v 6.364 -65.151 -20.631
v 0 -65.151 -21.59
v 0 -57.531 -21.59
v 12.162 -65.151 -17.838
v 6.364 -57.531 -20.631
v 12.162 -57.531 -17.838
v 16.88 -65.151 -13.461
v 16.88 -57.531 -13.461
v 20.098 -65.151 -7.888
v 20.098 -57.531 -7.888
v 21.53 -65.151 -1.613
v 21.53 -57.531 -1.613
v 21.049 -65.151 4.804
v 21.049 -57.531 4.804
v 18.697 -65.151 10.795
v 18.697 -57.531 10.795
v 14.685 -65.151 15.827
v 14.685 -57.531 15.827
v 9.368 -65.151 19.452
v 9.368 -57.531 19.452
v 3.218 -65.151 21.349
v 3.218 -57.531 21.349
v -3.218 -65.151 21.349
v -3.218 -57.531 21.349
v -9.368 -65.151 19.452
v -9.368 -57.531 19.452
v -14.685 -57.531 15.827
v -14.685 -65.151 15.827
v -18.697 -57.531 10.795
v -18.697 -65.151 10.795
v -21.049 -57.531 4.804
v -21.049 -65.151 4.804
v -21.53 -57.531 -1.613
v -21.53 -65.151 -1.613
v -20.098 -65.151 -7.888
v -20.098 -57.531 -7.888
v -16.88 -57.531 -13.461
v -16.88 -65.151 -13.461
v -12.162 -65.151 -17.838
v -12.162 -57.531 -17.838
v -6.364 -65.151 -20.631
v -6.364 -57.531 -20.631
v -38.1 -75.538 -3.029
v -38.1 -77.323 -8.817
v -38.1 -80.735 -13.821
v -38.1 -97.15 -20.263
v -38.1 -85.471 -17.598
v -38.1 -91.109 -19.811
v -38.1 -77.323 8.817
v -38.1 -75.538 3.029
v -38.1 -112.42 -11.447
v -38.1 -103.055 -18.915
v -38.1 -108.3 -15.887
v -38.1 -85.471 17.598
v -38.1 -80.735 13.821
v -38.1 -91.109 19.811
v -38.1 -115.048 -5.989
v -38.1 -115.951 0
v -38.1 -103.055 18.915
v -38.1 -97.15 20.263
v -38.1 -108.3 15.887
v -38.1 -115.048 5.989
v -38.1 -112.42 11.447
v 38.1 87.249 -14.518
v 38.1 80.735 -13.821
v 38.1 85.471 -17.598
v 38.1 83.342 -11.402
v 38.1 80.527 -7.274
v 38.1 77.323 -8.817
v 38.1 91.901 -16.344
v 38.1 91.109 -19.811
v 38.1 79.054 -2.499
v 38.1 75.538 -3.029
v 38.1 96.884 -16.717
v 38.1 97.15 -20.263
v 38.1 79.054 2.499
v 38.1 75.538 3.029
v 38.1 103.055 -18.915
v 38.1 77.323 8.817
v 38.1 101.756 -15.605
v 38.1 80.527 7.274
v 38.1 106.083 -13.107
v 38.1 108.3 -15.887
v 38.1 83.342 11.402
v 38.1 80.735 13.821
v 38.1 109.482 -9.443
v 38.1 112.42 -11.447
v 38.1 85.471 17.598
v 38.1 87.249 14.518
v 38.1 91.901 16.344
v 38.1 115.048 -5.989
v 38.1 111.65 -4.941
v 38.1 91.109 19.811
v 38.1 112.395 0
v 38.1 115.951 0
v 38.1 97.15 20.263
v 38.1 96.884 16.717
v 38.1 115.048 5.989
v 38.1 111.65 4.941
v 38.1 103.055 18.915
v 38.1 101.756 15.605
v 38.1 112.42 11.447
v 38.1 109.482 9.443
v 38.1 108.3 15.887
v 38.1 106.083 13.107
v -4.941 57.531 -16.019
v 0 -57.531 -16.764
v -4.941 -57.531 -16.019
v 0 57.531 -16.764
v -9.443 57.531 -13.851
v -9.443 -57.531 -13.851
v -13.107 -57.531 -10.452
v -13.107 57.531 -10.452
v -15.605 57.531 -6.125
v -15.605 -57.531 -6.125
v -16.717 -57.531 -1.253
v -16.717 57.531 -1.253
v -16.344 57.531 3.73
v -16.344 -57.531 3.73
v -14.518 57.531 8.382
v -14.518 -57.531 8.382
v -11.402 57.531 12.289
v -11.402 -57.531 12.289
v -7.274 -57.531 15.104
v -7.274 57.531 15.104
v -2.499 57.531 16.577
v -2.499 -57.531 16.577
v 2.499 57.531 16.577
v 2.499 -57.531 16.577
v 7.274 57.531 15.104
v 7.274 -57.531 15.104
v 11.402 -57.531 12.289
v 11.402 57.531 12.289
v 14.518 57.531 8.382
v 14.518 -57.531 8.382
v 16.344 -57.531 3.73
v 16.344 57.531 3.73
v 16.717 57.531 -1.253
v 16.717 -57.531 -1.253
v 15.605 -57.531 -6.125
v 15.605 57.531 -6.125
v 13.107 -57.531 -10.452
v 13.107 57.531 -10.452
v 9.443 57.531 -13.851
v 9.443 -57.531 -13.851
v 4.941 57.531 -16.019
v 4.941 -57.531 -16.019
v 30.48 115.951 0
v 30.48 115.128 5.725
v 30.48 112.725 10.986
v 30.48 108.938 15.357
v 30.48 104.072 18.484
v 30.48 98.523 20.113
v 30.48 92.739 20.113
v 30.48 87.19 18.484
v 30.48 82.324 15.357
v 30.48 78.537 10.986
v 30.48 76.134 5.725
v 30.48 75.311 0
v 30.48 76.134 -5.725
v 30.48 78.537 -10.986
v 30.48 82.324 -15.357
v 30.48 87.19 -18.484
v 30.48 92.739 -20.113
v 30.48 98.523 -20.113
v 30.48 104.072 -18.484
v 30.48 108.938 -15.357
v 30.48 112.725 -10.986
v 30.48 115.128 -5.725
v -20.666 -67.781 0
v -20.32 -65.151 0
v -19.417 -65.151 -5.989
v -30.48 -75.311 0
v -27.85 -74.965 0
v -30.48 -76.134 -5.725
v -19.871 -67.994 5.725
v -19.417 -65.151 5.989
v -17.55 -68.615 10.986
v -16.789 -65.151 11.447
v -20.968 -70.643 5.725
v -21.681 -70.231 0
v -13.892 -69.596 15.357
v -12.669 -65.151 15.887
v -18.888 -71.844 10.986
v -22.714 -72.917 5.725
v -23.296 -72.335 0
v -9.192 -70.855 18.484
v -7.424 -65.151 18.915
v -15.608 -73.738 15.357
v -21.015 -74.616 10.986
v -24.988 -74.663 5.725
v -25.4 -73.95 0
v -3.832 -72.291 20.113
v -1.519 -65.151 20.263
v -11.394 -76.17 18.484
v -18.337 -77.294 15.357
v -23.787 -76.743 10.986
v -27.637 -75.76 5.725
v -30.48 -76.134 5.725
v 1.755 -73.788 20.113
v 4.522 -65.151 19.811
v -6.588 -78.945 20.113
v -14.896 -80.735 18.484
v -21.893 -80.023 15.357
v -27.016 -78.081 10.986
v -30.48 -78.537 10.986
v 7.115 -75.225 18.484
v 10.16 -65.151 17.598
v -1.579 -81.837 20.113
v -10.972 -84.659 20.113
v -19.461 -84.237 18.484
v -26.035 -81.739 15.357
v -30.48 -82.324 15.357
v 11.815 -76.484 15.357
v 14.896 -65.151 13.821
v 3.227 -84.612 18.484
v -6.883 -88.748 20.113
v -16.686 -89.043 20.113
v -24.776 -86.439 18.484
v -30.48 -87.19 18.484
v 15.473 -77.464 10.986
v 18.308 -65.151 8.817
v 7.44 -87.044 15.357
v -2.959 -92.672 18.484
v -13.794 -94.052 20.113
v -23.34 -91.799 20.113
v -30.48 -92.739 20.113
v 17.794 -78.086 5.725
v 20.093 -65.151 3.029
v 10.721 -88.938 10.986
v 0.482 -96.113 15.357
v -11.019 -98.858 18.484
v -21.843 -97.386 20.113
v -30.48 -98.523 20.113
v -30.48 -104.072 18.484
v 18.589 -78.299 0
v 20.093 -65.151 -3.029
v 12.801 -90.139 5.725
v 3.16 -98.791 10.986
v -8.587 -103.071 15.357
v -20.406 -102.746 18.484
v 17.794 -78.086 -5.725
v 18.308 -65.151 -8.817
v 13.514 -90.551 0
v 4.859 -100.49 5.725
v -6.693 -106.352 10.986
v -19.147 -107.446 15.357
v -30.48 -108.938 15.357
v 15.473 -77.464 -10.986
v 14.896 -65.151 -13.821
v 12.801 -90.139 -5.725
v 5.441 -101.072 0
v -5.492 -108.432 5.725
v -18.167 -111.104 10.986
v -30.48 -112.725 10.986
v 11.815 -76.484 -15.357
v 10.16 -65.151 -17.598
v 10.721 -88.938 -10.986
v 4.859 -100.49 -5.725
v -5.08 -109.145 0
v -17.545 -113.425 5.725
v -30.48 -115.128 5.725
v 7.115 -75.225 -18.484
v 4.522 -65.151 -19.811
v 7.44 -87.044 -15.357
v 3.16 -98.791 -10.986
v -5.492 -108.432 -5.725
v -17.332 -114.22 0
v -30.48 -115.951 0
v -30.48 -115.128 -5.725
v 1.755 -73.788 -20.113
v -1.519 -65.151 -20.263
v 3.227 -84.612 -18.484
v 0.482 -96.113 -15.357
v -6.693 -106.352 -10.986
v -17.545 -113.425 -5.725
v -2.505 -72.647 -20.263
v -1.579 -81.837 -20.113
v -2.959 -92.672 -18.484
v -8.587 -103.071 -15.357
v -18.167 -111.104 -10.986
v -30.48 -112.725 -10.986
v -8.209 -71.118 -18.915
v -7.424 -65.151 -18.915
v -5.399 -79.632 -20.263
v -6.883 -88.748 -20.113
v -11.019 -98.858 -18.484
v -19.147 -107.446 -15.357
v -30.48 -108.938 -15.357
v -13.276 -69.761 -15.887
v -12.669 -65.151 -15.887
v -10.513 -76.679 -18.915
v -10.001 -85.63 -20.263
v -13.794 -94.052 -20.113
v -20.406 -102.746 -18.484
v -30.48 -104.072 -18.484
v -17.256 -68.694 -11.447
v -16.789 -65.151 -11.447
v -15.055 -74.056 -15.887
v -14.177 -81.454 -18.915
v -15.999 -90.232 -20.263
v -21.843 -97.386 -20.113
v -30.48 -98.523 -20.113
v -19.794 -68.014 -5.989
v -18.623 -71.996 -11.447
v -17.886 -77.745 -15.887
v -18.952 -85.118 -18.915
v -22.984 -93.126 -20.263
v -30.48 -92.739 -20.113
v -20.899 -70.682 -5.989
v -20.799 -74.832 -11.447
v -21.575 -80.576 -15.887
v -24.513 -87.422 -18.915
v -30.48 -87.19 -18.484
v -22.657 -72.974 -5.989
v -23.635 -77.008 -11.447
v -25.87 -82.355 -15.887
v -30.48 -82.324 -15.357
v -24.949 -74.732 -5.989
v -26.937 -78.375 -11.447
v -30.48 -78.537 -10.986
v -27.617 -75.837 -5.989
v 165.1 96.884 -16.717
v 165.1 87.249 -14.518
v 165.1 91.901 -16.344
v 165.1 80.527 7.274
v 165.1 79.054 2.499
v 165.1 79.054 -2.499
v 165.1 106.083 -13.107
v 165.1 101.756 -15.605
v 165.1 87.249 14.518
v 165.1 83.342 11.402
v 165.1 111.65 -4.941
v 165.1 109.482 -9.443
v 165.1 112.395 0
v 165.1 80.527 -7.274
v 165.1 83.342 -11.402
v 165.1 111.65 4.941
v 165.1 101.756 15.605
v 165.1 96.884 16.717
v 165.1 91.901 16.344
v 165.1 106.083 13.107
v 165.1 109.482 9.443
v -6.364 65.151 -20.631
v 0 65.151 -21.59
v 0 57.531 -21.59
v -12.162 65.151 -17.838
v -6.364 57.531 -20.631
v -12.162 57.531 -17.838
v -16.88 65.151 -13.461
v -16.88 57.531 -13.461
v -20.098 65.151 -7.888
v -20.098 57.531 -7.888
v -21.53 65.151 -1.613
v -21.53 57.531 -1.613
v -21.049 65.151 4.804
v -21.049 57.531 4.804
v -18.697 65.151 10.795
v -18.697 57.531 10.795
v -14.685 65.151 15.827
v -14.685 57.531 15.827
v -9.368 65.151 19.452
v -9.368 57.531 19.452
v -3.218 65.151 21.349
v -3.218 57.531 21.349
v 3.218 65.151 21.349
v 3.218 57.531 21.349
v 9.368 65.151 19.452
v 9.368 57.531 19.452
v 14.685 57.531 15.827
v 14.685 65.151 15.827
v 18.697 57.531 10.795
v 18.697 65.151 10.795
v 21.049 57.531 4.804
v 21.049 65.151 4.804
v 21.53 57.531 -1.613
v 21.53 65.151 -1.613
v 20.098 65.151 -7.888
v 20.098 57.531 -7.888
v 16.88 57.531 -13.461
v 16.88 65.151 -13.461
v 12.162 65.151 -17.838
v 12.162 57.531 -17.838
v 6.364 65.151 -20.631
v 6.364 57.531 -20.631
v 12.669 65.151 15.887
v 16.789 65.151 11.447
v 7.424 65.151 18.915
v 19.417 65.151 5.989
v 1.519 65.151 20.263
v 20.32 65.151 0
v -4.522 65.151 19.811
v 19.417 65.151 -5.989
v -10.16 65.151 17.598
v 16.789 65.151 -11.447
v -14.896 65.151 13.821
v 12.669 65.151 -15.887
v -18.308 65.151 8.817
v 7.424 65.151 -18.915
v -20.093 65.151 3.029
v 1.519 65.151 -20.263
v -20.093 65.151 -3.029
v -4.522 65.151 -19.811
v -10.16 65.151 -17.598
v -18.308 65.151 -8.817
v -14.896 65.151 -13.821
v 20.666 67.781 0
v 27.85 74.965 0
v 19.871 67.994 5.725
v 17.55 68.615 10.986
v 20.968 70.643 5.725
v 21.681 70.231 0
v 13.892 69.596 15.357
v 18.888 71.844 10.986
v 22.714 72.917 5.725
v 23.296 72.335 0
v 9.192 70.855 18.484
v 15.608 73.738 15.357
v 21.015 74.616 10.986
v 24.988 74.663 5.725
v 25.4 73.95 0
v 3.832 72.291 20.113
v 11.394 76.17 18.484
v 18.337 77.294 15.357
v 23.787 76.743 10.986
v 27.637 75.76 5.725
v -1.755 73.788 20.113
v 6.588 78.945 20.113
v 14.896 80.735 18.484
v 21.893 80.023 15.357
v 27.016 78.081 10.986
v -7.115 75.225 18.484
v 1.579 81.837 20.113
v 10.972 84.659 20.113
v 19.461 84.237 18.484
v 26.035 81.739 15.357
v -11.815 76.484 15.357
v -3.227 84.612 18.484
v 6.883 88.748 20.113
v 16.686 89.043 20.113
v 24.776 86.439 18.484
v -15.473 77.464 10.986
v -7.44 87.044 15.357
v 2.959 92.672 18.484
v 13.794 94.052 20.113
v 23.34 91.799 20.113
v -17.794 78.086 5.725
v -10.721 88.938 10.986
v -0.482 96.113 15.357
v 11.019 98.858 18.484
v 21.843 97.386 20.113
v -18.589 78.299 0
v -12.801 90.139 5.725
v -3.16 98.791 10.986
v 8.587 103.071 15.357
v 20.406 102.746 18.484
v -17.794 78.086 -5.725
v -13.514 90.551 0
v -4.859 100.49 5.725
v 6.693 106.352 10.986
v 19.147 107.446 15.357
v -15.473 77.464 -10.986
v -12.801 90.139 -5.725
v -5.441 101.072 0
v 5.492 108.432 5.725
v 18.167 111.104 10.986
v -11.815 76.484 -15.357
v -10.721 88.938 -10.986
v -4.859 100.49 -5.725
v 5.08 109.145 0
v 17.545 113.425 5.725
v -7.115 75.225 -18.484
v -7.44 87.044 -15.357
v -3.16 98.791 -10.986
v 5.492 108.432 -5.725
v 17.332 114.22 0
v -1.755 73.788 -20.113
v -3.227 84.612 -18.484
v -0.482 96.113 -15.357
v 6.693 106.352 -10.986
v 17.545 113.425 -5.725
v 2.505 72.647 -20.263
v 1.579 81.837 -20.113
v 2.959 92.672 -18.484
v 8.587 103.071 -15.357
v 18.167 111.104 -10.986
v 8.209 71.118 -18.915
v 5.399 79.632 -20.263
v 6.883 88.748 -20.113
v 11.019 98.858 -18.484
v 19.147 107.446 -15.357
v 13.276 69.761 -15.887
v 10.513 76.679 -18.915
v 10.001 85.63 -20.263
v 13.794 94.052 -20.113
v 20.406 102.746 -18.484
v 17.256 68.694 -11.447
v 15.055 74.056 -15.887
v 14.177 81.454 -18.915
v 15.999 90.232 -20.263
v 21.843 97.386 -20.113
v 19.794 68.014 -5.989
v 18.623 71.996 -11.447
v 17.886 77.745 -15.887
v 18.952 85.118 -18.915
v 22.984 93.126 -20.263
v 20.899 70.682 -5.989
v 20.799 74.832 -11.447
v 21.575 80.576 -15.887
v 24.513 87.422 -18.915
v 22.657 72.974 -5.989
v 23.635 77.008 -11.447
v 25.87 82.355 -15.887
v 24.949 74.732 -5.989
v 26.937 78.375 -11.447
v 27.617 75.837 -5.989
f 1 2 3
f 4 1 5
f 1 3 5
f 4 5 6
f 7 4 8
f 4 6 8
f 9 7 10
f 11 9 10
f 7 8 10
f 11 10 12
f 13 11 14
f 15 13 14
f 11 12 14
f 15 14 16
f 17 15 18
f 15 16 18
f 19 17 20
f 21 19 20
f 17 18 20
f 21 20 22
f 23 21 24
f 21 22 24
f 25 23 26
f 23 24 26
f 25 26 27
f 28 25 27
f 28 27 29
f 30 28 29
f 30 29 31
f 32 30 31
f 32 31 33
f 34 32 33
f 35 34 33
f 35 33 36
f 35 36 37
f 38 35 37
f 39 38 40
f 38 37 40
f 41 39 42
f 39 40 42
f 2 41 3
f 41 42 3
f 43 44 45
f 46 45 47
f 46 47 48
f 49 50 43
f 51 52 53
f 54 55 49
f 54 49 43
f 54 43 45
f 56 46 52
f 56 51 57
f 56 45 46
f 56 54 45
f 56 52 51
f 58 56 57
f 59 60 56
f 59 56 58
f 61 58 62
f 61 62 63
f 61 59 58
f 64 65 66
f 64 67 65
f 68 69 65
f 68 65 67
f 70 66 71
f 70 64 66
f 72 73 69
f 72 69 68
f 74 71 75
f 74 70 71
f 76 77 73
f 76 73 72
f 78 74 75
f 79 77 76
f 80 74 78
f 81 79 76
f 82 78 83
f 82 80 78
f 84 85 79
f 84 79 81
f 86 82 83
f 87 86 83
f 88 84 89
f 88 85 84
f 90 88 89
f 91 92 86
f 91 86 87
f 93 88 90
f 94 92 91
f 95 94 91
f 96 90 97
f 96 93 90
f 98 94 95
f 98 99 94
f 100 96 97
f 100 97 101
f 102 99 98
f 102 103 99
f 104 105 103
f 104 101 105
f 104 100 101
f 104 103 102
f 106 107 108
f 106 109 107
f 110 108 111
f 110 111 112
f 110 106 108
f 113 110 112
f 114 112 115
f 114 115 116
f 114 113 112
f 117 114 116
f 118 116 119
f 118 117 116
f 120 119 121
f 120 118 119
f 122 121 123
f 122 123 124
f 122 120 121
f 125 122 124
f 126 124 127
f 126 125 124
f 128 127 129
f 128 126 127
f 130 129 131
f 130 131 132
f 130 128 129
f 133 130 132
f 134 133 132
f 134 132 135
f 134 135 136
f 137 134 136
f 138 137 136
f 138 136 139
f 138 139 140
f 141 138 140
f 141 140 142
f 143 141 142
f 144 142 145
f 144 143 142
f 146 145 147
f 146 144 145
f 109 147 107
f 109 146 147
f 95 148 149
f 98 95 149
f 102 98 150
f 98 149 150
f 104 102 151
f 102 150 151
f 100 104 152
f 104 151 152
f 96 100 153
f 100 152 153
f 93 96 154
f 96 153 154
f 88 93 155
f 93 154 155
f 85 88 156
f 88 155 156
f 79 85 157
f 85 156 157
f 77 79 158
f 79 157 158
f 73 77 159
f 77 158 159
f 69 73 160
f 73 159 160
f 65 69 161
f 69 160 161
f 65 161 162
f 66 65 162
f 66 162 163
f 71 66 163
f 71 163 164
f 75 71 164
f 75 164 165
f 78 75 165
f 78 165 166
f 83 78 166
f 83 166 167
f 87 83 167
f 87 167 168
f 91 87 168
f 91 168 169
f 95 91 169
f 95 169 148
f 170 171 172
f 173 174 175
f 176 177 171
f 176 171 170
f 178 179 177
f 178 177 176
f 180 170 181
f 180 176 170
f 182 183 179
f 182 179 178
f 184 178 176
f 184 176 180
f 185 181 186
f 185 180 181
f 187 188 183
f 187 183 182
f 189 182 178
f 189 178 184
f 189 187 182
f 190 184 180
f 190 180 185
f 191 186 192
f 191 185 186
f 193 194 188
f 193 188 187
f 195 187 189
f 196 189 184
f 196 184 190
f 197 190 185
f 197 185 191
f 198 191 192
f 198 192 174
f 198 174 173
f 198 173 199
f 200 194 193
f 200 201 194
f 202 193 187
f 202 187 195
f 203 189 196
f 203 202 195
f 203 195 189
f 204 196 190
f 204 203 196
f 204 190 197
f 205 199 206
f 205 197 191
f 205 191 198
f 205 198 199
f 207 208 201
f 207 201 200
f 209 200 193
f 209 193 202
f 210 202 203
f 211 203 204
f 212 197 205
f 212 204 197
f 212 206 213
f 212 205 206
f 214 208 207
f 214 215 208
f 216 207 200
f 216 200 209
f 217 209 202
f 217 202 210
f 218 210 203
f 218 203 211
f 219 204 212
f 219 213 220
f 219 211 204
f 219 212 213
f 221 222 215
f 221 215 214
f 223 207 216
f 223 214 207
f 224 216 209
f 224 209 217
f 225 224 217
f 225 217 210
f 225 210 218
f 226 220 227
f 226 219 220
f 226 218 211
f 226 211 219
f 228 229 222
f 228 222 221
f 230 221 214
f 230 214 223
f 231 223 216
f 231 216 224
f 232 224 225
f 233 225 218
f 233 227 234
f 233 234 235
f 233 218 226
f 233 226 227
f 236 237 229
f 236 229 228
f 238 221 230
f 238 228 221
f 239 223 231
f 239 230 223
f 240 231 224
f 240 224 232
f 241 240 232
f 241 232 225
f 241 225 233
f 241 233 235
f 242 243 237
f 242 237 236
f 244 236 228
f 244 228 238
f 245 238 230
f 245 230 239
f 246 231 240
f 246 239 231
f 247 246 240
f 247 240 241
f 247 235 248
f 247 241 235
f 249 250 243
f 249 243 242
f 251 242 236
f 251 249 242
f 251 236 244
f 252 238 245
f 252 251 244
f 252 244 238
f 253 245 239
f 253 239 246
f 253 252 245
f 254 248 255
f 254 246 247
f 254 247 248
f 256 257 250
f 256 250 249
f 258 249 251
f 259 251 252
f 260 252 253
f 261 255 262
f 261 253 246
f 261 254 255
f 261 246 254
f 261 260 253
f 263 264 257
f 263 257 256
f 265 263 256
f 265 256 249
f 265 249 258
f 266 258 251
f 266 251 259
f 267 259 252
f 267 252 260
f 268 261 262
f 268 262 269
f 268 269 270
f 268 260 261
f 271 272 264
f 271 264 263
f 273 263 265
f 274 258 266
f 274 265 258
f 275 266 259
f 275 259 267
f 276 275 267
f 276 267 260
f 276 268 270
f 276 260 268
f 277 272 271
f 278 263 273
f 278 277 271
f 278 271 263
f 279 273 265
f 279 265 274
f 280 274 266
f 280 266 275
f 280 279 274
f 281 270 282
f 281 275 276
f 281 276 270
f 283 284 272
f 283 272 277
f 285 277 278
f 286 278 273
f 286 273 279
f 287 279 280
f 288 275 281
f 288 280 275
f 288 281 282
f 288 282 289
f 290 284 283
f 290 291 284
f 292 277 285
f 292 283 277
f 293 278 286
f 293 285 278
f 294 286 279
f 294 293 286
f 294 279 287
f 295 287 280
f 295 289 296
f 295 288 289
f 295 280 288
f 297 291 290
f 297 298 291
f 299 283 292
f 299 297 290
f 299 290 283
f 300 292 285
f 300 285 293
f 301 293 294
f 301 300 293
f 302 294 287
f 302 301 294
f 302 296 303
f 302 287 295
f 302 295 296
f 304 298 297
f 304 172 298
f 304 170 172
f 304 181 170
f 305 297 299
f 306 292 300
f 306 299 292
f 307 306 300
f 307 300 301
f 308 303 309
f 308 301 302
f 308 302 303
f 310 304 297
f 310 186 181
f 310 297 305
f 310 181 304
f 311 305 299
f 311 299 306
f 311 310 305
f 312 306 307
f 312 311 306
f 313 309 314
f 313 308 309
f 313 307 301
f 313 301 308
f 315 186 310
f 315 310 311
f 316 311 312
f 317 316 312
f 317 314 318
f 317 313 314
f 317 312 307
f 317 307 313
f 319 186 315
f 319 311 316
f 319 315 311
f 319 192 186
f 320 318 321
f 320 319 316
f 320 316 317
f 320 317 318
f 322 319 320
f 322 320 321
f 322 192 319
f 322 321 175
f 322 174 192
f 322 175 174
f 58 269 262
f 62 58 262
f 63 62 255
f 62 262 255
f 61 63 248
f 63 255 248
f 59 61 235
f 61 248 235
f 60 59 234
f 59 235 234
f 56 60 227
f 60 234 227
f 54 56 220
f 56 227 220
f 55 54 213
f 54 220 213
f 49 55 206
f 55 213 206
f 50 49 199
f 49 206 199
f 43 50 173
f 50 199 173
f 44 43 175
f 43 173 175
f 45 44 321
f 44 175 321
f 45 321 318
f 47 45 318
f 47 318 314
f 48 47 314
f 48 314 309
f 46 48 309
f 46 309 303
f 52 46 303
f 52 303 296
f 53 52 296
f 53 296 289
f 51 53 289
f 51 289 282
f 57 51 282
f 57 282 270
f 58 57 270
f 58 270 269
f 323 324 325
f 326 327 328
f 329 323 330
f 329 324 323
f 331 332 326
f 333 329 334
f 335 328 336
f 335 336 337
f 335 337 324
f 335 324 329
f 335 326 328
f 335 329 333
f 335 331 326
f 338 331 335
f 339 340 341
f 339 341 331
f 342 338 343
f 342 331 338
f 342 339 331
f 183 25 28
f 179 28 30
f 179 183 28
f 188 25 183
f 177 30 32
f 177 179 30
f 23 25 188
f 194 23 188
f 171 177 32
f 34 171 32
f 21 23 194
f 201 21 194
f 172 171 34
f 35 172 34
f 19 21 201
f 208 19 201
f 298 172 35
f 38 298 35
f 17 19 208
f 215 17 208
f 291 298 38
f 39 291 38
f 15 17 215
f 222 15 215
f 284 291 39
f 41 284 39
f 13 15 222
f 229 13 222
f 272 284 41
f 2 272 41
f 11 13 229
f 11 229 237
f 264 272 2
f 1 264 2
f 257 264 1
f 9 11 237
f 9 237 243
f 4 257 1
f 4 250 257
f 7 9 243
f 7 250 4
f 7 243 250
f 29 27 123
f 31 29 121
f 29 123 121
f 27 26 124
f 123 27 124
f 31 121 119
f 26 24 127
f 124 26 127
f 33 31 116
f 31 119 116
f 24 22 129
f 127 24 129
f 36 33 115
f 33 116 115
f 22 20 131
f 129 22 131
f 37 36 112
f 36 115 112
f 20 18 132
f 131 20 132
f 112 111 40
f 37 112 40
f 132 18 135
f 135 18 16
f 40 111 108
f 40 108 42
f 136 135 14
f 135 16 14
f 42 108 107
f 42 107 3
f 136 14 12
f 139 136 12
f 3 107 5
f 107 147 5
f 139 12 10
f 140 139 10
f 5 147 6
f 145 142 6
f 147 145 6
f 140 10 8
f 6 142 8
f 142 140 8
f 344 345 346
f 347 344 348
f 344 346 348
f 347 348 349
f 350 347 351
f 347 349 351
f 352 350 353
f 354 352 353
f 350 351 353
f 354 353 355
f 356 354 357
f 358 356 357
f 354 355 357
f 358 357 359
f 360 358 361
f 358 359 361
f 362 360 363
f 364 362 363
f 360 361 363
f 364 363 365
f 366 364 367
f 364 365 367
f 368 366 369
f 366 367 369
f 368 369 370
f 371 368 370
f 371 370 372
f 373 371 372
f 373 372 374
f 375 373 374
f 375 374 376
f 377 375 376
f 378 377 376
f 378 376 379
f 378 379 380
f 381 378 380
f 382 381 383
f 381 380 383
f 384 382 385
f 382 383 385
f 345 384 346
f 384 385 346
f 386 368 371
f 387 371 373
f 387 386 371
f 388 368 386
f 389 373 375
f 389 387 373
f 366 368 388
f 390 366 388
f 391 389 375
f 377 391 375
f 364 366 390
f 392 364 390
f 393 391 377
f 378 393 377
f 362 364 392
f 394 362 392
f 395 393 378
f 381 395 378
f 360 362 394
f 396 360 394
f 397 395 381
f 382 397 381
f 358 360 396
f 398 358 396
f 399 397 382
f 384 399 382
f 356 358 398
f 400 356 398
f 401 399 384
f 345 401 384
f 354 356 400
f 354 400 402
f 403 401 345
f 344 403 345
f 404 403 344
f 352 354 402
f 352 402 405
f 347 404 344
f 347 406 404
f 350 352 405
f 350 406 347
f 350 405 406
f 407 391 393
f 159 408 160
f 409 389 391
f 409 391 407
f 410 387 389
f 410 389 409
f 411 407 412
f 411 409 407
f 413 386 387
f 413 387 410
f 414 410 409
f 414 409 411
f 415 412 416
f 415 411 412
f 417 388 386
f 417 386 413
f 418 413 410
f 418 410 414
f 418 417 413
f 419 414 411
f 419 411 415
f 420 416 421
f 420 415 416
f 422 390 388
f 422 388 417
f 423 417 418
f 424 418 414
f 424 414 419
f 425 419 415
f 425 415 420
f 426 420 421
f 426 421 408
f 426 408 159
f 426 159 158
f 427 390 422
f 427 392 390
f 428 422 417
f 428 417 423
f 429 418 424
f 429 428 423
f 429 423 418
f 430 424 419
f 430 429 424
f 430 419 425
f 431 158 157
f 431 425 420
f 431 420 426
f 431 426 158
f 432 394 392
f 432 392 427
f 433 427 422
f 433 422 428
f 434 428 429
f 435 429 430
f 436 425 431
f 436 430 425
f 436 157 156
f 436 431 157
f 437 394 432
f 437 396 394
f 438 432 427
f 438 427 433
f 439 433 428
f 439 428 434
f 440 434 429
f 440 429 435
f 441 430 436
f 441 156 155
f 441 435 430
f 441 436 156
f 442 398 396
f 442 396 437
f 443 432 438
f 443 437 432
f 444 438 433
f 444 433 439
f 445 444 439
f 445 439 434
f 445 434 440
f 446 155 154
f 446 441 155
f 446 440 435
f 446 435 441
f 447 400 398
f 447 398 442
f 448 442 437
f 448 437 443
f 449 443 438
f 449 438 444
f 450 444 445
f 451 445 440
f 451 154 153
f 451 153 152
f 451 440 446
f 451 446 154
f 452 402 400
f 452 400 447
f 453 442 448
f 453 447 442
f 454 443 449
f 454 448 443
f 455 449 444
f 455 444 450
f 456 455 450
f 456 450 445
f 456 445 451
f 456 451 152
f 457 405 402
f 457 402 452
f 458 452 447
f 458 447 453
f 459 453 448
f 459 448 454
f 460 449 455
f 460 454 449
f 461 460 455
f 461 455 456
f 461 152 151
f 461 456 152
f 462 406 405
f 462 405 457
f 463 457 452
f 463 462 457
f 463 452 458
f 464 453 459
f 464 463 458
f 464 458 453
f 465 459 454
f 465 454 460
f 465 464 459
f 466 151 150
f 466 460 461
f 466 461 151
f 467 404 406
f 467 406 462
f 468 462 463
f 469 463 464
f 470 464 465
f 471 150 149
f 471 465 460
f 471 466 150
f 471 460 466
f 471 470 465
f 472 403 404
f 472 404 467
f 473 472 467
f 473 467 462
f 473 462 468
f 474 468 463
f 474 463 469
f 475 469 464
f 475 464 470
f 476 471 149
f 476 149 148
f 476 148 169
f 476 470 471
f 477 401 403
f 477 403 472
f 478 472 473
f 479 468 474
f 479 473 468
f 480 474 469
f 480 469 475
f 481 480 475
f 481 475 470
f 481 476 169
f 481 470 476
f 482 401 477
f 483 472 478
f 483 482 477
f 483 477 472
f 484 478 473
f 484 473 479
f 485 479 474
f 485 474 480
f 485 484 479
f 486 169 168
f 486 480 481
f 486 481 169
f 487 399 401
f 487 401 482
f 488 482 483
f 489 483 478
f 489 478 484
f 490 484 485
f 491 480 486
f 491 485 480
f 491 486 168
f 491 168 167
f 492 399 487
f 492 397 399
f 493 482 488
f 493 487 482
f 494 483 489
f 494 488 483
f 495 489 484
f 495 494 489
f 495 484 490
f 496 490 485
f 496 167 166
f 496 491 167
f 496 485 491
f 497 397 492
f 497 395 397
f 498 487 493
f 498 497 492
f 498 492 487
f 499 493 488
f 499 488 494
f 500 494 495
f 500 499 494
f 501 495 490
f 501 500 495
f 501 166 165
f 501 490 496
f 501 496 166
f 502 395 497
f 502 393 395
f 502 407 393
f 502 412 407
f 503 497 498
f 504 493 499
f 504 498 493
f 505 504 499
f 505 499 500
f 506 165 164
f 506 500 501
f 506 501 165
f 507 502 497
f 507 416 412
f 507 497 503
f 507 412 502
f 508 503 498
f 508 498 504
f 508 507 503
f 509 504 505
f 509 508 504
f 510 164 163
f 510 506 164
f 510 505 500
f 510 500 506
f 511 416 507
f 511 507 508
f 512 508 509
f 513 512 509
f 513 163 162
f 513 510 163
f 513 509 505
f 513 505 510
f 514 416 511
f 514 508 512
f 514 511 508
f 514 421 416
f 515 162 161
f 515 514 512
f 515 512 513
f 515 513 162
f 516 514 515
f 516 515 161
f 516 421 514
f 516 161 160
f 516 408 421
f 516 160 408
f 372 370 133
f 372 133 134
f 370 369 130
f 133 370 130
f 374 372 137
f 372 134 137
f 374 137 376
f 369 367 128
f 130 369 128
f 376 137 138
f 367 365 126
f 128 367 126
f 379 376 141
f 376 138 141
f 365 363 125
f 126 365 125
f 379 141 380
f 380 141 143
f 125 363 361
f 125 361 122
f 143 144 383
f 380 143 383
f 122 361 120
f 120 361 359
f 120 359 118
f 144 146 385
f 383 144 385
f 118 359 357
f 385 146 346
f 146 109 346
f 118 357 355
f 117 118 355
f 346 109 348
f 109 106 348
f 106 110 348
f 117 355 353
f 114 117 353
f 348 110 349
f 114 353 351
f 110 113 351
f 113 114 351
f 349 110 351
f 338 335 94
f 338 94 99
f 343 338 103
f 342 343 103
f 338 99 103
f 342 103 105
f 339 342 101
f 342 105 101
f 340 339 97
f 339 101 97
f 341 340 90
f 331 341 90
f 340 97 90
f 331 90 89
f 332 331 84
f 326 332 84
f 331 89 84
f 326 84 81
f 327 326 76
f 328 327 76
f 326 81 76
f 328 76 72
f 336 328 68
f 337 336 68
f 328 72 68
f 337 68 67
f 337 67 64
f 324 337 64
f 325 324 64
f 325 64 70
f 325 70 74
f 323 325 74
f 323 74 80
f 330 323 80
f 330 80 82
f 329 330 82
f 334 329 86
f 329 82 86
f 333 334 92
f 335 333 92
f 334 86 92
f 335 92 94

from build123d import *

# Parameters (mm, degrees)
SKETCH1_R           = 16.764
BOSS_EXTRUDE1_DEPTH = 57.531
SKETCH3_R           = 21.59
BOSS_EXTRUDE2_DEPTH = 7.62
SKETCH5_R           = 20.32
SKETCH6_R           = 20.32
BOSS_EXTRUDE3_DEPTH = 7.62
CIRPATTERN1_COUNT   = 2
SKETCH9_R           = 16.764
BOSS_EXTRUDE4_DEPTH = 127


with BuildPart() as part:
    # Sketch1 → Boss-Extrude1 (new, symmetric)
    with BuildSketch(Plane(origin=(0, 0, 0), x_dir=(1, 0, 0), z_dir=(0, 1, 0))):
        with Locations(Location((0, 0, 0), (0, 0, 90))):
            Circle(SKETCH1_R)
    extrude(amount=BOSS_EXTRUDE1_DEPTH, both=True)

    # Sketch3 → Boss-Extrude2 (add)
    with BuildSketch(Plane(origin=(0, 57.531, 0), x_dir=(1, 0, 0), z_dir=(0, 1, 0))):
        with Locations(Location((0, 0, 0), (0, 0, 90))):
            Circle(SKETCH3_R)
    boss_extrude2 = extrude(amount=BOSS_EXTRUDE2_DEPTH)

    # Sweep1: sweep along a path in Sketch4
    with BuildLine(Plane.XY) as sweep1_path:
        ThreePointArc((0, 65.151), (8.927385309, 86.703614691), (30.48, 95.631))
    # Sketch5 → Sweep1 (sweep)
    with BuildSketch(Plane(origin=(0, 65.151, 0), x_dir=(1, 0, 0), z_dir=(0, 1, 0))):
        Circle(SKETCH5_R)
    sweep1 = sweep(path=sweep1_path.line)

    # Sketch6 → Boss-Extrude3 (add)
    with BuildSketch(Plane(origin=(30.48, 0, 0), x_dir=(0, 0, -1), z_dir=(1, 0, 0))):
        with Locations(Location((0, 95.631, 0), (0, 0, 90))):
            Circle(SKETCH6_R)
    boss_extrude3 = extrude(amount=BOSS_EXTRUDE3_DEPTH)

    # CirPattern1: Boss-Extrude2, Sweep1, Boss-Extrude3 ×2 about axis
    cirpattern1_axis = Axis((0, 0, 0), (0, 0, 1))
    add([boss_extrude2.rotate(cirpattern1_axis, i * 360 / CIRPATTERN1_COUNT) for i in range(1, CIRPATTERN1_COUNT)])
    add([sweep1.rotate(cirpattern1_axis, i * 360 / CIRPATTERN1_COUNT) for i in range(1, CIRPATTERN1_COUNT)])
    add([boss_extrude3.rotate(cirpattern1_axis, i * 360 / CIRPATTERN1_COUNT) for i in range(1, CIRPATTERN1_COUNT)])

    # Sketch9 → Boss-Extrude4 (add)
    with BuildSketch(Plane(origin=(38.1, 0, 0), x_dir=(0, 0, -1), z_dir=(1, 0, 0))):
        with Locations(Location((0, 95.631, 0), (0, 0, 90))):
            Circle(SKETCH9_R)
    extrude(amount=BOSS_EXTRUDE4_DEPTH)


solid = part.part
